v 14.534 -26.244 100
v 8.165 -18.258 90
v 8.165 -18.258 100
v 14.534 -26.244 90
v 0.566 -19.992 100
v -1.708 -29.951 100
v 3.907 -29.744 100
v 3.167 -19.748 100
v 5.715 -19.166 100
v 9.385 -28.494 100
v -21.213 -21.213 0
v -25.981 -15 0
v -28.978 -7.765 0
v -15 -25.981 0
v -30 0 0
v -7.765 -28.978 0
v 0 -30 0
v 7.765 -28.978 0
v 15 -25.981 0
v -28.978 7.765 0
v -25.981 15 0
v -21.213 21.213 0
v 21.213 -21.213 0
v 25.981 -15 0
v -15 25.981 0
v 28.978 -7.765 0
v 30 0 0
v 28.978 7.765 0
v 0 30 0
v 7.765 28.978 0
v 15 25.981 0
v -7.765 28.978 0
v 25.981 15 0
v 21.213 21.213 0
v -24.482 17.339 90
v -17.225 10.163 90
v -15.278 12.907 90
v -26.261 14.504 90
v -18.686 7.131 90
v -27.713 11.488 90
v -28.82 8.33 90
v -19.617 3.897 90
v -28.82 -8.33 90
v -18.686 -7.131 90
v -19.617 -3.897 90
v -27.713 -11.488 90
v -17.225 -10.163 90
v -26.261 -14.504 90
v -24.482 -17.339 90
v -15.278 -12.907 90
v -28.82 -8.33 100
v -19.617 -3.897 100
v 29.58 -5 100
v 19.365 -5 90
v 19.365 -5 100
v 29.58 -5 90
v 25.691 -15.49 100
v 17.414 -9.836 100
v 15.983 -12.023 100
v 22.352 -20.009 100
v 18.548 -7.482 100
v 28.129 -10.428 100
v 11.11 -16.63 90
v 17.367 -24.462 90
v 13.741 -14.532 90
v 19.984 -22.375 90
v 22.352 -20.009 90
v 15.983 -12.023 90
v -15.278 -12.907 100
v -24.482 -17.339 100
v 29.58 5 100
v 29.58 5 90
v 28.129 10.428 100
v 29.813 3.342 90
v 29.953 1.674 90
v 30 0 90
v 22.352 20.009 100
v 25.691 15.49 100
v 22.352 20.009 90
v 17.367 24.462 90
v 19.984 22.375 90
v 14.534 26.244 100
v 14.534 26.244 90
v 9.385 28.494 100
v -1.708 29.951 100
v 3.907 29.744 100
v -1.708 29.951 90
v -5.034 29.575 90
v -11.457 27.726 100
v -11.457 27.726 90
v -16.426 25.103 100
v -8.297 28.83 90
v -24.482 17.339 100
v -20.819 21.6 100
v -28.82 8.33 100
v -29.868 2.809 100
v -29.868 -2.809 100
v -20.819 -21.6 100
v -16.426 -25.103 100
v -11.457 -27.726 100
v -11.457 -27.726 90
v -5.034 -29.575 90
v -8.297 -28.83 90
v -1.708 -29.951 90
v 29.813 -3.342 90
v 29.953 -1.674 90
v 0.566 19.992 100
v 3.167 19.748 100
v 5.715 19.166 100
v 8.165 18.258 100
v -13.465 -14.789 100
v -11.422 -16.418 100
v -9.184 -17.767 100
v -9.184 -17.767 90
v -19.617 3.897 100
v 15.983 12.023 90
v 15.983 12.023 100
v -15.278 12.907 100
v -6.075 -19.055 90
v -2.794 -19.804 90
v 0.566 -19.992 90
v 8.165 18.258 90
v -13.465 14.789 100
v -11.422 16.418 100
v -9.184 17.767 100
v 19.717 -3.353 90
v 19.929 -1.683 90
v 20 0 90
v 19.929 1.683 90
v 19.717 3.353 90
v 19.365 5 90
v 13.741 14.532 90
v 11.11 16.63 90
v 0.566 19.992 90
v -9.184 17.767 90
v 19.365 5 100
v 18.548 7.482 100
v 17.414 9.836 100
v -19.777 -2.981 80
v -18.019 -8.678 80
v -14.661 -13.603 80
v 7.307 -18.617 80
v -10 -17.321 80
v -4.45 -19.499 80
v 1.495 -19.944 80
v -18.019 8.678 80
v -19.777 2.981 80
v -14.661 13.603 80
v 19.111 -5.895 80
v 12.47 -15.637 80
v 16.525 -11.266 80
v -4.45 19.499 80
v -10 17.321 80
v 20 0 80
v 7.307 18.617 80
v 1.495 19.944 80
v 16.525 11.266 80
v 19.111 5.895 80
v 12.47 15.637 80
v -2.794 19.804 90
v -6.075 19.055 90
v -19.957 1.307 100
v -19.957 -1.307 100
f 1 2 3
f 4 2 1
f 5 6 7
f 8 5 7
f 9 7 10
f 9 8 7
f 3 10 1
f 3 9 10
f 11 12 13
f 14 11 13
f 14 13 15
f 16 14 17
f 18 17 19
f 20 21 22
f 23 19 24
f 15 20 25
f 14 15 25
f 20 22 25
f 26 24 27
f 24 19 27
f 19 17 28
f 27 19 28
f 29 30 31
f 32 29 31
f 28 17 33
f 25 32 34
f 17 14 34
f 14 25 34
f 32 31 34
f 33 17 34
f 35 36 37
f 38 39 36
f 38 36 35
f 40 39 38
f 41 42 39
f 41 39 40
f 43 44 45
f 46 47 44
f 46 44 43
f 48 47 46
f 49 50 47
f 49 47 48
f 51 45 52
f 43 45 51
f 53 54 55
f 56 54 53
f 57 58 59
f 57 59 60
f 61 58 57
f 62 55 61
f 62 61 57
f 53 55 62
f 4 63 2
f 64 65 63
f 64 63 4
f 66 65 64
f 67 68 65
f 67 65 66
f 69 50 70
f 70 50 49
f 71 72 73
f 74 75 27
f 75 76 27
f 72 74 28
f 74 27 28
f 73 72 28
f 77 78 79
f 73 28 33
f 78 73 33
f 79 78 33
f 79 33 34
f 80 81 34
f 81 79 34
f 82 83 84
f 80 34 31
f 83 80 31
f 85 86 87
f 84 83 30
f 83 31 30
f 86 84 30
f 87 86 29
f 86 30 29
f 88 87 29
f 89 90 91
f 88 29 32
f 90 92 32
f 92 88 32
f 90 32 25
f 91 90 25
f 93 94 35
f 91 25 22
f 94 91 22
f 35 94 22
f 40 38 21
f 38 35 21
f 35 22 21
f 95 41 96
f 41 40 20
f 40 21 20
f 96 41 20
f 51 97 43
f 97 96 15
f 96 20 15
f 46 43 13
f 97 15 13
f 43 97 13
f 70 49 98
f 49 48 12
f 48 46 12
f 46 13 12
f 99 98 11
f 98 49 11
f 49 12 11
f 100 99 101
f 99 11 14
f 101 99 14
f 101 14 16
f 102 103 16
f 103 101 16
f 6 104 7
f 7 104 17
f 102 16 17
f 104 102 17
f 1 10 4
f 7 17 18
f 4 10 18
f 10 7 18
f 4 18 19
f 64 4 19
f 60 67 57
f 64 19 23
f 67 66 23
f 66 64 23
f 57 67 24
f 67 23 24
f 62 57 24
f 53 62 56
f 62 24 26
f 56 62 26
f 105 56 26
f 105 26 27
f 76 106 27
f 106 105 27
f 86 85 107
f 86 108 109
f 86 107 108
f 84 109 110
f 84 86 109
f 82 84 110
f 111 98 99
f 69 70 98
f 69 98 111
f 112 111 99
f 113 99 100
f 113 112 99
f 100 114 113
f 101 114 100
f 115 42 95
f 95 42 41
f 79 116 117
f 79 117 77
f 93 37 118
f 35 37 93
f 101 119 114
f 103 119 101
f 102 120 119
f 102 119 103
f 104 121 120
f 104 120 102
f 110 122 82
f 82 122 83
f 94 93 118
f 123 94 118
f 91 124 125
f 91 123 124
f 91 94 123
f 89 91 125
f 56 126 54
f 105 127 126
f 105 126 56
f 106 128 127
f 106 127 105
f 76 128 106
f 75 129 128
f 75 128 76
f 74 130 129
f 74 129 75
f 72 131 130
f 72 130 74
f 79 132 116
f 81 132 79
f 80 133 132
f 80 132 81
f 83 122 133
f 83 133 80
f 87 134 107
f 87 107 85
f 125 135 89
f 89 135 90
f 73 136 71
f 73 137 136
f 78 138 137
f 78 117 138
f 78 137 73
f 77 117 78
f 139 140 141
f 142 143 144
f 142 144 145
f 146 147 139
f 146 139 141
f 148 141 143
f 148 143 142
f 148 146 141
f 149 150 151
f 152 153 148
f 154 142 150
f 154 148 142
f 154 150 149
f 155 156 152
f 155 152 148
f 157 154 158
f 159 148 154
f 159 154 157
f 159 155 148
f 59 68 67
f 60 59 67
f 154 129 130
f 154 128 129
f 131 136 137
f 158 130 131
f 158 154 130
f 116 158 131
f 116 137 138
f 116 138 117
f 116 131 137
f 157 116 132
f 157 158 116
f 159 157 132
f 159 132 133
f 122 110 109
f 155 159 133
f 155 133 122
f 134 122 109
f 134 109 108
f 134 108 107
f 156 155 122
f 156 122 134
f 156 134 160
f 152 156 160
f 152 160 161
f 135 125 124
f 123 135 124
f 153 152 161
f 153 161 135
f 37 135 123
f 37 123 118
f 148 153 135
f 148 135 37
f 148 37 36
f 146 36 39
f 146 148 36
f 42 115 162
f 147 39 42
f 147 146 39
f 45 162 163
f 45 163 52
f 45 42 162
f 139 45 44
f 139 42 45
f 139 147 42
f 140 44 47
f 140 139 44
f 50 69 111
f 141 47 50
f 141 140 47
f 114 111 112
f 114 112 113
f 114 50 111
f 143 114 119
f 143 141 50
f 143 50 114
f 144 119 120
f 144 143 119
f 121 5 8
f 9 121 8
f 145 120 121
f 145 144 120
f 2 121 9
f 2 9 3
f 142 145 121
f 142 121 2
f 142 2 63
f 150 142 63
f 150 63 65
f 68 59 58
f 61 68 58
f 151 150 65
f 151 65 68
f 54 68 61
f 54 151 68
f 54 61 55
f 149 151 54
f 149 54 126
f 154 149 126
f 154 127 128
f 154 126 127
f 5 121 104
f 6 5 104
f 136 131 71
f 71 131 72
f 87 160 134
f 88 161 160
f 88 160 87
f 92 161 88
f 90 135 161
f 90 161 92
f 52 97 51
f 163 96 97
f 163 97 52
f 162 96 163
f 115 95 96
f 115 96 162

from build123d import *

# Parameters (mm, degrees)
BOX_W             = 20
BOX_H             = 10
BOX_DEPTH         = 10
ARRAY_COUNT       = 7
CYLINDER001_R     = 20
CYLINDER001_DEPTH = 20
CYLINDER_R        = 30
CYLINDER_DEPTH    = 100


with BuildPart() as array:
    # Box → Box (new body)
    with BuildSketch(Plane(origin=(18, -5, 90), x_dir=(1, 0, 0), z_dir=(0, 0, 1))):
        with Locations((10, 5)):
            Rectangle(BOX_W, BOX_H)
    extrude(amount=BOX_DEPTH)

    # Array: Array ×7 about axis
    array_axis = Axis((0, 0, 0), (0, 0, 1))


with BuildPart() as array_1:
    add(array.part)
    for i in range(1, ARRAY_COUNT):
        add(array.part.rotate(array_axis, i * 360 / ARRAY_COUNT))


with BuildPart() as cylinder001:
    # Cylinder001 → Cylinder001 (new body)
    with BuildSketch(Plane.XY.offset(80)):
        Circle(CYLINDER001_R)
    extrude(amount=CYLINDER001_DEPTH)


with BuildPart() as cut001:
    # Cylinder → Cylinder (new body)
    with BuildSketch(Plane.XY):
        Circle(CYLINDER_R)
    extrude(amount=CYLINDER_DEPTH)

    # Cut: cut Cylinder001
    add(cylinder001.part, mode=Mode.SUBTRACT)

    # Cut001: cut Array
    add(array_1.part, mode=Mode.SUBTRACT)


solid = cut001.part
